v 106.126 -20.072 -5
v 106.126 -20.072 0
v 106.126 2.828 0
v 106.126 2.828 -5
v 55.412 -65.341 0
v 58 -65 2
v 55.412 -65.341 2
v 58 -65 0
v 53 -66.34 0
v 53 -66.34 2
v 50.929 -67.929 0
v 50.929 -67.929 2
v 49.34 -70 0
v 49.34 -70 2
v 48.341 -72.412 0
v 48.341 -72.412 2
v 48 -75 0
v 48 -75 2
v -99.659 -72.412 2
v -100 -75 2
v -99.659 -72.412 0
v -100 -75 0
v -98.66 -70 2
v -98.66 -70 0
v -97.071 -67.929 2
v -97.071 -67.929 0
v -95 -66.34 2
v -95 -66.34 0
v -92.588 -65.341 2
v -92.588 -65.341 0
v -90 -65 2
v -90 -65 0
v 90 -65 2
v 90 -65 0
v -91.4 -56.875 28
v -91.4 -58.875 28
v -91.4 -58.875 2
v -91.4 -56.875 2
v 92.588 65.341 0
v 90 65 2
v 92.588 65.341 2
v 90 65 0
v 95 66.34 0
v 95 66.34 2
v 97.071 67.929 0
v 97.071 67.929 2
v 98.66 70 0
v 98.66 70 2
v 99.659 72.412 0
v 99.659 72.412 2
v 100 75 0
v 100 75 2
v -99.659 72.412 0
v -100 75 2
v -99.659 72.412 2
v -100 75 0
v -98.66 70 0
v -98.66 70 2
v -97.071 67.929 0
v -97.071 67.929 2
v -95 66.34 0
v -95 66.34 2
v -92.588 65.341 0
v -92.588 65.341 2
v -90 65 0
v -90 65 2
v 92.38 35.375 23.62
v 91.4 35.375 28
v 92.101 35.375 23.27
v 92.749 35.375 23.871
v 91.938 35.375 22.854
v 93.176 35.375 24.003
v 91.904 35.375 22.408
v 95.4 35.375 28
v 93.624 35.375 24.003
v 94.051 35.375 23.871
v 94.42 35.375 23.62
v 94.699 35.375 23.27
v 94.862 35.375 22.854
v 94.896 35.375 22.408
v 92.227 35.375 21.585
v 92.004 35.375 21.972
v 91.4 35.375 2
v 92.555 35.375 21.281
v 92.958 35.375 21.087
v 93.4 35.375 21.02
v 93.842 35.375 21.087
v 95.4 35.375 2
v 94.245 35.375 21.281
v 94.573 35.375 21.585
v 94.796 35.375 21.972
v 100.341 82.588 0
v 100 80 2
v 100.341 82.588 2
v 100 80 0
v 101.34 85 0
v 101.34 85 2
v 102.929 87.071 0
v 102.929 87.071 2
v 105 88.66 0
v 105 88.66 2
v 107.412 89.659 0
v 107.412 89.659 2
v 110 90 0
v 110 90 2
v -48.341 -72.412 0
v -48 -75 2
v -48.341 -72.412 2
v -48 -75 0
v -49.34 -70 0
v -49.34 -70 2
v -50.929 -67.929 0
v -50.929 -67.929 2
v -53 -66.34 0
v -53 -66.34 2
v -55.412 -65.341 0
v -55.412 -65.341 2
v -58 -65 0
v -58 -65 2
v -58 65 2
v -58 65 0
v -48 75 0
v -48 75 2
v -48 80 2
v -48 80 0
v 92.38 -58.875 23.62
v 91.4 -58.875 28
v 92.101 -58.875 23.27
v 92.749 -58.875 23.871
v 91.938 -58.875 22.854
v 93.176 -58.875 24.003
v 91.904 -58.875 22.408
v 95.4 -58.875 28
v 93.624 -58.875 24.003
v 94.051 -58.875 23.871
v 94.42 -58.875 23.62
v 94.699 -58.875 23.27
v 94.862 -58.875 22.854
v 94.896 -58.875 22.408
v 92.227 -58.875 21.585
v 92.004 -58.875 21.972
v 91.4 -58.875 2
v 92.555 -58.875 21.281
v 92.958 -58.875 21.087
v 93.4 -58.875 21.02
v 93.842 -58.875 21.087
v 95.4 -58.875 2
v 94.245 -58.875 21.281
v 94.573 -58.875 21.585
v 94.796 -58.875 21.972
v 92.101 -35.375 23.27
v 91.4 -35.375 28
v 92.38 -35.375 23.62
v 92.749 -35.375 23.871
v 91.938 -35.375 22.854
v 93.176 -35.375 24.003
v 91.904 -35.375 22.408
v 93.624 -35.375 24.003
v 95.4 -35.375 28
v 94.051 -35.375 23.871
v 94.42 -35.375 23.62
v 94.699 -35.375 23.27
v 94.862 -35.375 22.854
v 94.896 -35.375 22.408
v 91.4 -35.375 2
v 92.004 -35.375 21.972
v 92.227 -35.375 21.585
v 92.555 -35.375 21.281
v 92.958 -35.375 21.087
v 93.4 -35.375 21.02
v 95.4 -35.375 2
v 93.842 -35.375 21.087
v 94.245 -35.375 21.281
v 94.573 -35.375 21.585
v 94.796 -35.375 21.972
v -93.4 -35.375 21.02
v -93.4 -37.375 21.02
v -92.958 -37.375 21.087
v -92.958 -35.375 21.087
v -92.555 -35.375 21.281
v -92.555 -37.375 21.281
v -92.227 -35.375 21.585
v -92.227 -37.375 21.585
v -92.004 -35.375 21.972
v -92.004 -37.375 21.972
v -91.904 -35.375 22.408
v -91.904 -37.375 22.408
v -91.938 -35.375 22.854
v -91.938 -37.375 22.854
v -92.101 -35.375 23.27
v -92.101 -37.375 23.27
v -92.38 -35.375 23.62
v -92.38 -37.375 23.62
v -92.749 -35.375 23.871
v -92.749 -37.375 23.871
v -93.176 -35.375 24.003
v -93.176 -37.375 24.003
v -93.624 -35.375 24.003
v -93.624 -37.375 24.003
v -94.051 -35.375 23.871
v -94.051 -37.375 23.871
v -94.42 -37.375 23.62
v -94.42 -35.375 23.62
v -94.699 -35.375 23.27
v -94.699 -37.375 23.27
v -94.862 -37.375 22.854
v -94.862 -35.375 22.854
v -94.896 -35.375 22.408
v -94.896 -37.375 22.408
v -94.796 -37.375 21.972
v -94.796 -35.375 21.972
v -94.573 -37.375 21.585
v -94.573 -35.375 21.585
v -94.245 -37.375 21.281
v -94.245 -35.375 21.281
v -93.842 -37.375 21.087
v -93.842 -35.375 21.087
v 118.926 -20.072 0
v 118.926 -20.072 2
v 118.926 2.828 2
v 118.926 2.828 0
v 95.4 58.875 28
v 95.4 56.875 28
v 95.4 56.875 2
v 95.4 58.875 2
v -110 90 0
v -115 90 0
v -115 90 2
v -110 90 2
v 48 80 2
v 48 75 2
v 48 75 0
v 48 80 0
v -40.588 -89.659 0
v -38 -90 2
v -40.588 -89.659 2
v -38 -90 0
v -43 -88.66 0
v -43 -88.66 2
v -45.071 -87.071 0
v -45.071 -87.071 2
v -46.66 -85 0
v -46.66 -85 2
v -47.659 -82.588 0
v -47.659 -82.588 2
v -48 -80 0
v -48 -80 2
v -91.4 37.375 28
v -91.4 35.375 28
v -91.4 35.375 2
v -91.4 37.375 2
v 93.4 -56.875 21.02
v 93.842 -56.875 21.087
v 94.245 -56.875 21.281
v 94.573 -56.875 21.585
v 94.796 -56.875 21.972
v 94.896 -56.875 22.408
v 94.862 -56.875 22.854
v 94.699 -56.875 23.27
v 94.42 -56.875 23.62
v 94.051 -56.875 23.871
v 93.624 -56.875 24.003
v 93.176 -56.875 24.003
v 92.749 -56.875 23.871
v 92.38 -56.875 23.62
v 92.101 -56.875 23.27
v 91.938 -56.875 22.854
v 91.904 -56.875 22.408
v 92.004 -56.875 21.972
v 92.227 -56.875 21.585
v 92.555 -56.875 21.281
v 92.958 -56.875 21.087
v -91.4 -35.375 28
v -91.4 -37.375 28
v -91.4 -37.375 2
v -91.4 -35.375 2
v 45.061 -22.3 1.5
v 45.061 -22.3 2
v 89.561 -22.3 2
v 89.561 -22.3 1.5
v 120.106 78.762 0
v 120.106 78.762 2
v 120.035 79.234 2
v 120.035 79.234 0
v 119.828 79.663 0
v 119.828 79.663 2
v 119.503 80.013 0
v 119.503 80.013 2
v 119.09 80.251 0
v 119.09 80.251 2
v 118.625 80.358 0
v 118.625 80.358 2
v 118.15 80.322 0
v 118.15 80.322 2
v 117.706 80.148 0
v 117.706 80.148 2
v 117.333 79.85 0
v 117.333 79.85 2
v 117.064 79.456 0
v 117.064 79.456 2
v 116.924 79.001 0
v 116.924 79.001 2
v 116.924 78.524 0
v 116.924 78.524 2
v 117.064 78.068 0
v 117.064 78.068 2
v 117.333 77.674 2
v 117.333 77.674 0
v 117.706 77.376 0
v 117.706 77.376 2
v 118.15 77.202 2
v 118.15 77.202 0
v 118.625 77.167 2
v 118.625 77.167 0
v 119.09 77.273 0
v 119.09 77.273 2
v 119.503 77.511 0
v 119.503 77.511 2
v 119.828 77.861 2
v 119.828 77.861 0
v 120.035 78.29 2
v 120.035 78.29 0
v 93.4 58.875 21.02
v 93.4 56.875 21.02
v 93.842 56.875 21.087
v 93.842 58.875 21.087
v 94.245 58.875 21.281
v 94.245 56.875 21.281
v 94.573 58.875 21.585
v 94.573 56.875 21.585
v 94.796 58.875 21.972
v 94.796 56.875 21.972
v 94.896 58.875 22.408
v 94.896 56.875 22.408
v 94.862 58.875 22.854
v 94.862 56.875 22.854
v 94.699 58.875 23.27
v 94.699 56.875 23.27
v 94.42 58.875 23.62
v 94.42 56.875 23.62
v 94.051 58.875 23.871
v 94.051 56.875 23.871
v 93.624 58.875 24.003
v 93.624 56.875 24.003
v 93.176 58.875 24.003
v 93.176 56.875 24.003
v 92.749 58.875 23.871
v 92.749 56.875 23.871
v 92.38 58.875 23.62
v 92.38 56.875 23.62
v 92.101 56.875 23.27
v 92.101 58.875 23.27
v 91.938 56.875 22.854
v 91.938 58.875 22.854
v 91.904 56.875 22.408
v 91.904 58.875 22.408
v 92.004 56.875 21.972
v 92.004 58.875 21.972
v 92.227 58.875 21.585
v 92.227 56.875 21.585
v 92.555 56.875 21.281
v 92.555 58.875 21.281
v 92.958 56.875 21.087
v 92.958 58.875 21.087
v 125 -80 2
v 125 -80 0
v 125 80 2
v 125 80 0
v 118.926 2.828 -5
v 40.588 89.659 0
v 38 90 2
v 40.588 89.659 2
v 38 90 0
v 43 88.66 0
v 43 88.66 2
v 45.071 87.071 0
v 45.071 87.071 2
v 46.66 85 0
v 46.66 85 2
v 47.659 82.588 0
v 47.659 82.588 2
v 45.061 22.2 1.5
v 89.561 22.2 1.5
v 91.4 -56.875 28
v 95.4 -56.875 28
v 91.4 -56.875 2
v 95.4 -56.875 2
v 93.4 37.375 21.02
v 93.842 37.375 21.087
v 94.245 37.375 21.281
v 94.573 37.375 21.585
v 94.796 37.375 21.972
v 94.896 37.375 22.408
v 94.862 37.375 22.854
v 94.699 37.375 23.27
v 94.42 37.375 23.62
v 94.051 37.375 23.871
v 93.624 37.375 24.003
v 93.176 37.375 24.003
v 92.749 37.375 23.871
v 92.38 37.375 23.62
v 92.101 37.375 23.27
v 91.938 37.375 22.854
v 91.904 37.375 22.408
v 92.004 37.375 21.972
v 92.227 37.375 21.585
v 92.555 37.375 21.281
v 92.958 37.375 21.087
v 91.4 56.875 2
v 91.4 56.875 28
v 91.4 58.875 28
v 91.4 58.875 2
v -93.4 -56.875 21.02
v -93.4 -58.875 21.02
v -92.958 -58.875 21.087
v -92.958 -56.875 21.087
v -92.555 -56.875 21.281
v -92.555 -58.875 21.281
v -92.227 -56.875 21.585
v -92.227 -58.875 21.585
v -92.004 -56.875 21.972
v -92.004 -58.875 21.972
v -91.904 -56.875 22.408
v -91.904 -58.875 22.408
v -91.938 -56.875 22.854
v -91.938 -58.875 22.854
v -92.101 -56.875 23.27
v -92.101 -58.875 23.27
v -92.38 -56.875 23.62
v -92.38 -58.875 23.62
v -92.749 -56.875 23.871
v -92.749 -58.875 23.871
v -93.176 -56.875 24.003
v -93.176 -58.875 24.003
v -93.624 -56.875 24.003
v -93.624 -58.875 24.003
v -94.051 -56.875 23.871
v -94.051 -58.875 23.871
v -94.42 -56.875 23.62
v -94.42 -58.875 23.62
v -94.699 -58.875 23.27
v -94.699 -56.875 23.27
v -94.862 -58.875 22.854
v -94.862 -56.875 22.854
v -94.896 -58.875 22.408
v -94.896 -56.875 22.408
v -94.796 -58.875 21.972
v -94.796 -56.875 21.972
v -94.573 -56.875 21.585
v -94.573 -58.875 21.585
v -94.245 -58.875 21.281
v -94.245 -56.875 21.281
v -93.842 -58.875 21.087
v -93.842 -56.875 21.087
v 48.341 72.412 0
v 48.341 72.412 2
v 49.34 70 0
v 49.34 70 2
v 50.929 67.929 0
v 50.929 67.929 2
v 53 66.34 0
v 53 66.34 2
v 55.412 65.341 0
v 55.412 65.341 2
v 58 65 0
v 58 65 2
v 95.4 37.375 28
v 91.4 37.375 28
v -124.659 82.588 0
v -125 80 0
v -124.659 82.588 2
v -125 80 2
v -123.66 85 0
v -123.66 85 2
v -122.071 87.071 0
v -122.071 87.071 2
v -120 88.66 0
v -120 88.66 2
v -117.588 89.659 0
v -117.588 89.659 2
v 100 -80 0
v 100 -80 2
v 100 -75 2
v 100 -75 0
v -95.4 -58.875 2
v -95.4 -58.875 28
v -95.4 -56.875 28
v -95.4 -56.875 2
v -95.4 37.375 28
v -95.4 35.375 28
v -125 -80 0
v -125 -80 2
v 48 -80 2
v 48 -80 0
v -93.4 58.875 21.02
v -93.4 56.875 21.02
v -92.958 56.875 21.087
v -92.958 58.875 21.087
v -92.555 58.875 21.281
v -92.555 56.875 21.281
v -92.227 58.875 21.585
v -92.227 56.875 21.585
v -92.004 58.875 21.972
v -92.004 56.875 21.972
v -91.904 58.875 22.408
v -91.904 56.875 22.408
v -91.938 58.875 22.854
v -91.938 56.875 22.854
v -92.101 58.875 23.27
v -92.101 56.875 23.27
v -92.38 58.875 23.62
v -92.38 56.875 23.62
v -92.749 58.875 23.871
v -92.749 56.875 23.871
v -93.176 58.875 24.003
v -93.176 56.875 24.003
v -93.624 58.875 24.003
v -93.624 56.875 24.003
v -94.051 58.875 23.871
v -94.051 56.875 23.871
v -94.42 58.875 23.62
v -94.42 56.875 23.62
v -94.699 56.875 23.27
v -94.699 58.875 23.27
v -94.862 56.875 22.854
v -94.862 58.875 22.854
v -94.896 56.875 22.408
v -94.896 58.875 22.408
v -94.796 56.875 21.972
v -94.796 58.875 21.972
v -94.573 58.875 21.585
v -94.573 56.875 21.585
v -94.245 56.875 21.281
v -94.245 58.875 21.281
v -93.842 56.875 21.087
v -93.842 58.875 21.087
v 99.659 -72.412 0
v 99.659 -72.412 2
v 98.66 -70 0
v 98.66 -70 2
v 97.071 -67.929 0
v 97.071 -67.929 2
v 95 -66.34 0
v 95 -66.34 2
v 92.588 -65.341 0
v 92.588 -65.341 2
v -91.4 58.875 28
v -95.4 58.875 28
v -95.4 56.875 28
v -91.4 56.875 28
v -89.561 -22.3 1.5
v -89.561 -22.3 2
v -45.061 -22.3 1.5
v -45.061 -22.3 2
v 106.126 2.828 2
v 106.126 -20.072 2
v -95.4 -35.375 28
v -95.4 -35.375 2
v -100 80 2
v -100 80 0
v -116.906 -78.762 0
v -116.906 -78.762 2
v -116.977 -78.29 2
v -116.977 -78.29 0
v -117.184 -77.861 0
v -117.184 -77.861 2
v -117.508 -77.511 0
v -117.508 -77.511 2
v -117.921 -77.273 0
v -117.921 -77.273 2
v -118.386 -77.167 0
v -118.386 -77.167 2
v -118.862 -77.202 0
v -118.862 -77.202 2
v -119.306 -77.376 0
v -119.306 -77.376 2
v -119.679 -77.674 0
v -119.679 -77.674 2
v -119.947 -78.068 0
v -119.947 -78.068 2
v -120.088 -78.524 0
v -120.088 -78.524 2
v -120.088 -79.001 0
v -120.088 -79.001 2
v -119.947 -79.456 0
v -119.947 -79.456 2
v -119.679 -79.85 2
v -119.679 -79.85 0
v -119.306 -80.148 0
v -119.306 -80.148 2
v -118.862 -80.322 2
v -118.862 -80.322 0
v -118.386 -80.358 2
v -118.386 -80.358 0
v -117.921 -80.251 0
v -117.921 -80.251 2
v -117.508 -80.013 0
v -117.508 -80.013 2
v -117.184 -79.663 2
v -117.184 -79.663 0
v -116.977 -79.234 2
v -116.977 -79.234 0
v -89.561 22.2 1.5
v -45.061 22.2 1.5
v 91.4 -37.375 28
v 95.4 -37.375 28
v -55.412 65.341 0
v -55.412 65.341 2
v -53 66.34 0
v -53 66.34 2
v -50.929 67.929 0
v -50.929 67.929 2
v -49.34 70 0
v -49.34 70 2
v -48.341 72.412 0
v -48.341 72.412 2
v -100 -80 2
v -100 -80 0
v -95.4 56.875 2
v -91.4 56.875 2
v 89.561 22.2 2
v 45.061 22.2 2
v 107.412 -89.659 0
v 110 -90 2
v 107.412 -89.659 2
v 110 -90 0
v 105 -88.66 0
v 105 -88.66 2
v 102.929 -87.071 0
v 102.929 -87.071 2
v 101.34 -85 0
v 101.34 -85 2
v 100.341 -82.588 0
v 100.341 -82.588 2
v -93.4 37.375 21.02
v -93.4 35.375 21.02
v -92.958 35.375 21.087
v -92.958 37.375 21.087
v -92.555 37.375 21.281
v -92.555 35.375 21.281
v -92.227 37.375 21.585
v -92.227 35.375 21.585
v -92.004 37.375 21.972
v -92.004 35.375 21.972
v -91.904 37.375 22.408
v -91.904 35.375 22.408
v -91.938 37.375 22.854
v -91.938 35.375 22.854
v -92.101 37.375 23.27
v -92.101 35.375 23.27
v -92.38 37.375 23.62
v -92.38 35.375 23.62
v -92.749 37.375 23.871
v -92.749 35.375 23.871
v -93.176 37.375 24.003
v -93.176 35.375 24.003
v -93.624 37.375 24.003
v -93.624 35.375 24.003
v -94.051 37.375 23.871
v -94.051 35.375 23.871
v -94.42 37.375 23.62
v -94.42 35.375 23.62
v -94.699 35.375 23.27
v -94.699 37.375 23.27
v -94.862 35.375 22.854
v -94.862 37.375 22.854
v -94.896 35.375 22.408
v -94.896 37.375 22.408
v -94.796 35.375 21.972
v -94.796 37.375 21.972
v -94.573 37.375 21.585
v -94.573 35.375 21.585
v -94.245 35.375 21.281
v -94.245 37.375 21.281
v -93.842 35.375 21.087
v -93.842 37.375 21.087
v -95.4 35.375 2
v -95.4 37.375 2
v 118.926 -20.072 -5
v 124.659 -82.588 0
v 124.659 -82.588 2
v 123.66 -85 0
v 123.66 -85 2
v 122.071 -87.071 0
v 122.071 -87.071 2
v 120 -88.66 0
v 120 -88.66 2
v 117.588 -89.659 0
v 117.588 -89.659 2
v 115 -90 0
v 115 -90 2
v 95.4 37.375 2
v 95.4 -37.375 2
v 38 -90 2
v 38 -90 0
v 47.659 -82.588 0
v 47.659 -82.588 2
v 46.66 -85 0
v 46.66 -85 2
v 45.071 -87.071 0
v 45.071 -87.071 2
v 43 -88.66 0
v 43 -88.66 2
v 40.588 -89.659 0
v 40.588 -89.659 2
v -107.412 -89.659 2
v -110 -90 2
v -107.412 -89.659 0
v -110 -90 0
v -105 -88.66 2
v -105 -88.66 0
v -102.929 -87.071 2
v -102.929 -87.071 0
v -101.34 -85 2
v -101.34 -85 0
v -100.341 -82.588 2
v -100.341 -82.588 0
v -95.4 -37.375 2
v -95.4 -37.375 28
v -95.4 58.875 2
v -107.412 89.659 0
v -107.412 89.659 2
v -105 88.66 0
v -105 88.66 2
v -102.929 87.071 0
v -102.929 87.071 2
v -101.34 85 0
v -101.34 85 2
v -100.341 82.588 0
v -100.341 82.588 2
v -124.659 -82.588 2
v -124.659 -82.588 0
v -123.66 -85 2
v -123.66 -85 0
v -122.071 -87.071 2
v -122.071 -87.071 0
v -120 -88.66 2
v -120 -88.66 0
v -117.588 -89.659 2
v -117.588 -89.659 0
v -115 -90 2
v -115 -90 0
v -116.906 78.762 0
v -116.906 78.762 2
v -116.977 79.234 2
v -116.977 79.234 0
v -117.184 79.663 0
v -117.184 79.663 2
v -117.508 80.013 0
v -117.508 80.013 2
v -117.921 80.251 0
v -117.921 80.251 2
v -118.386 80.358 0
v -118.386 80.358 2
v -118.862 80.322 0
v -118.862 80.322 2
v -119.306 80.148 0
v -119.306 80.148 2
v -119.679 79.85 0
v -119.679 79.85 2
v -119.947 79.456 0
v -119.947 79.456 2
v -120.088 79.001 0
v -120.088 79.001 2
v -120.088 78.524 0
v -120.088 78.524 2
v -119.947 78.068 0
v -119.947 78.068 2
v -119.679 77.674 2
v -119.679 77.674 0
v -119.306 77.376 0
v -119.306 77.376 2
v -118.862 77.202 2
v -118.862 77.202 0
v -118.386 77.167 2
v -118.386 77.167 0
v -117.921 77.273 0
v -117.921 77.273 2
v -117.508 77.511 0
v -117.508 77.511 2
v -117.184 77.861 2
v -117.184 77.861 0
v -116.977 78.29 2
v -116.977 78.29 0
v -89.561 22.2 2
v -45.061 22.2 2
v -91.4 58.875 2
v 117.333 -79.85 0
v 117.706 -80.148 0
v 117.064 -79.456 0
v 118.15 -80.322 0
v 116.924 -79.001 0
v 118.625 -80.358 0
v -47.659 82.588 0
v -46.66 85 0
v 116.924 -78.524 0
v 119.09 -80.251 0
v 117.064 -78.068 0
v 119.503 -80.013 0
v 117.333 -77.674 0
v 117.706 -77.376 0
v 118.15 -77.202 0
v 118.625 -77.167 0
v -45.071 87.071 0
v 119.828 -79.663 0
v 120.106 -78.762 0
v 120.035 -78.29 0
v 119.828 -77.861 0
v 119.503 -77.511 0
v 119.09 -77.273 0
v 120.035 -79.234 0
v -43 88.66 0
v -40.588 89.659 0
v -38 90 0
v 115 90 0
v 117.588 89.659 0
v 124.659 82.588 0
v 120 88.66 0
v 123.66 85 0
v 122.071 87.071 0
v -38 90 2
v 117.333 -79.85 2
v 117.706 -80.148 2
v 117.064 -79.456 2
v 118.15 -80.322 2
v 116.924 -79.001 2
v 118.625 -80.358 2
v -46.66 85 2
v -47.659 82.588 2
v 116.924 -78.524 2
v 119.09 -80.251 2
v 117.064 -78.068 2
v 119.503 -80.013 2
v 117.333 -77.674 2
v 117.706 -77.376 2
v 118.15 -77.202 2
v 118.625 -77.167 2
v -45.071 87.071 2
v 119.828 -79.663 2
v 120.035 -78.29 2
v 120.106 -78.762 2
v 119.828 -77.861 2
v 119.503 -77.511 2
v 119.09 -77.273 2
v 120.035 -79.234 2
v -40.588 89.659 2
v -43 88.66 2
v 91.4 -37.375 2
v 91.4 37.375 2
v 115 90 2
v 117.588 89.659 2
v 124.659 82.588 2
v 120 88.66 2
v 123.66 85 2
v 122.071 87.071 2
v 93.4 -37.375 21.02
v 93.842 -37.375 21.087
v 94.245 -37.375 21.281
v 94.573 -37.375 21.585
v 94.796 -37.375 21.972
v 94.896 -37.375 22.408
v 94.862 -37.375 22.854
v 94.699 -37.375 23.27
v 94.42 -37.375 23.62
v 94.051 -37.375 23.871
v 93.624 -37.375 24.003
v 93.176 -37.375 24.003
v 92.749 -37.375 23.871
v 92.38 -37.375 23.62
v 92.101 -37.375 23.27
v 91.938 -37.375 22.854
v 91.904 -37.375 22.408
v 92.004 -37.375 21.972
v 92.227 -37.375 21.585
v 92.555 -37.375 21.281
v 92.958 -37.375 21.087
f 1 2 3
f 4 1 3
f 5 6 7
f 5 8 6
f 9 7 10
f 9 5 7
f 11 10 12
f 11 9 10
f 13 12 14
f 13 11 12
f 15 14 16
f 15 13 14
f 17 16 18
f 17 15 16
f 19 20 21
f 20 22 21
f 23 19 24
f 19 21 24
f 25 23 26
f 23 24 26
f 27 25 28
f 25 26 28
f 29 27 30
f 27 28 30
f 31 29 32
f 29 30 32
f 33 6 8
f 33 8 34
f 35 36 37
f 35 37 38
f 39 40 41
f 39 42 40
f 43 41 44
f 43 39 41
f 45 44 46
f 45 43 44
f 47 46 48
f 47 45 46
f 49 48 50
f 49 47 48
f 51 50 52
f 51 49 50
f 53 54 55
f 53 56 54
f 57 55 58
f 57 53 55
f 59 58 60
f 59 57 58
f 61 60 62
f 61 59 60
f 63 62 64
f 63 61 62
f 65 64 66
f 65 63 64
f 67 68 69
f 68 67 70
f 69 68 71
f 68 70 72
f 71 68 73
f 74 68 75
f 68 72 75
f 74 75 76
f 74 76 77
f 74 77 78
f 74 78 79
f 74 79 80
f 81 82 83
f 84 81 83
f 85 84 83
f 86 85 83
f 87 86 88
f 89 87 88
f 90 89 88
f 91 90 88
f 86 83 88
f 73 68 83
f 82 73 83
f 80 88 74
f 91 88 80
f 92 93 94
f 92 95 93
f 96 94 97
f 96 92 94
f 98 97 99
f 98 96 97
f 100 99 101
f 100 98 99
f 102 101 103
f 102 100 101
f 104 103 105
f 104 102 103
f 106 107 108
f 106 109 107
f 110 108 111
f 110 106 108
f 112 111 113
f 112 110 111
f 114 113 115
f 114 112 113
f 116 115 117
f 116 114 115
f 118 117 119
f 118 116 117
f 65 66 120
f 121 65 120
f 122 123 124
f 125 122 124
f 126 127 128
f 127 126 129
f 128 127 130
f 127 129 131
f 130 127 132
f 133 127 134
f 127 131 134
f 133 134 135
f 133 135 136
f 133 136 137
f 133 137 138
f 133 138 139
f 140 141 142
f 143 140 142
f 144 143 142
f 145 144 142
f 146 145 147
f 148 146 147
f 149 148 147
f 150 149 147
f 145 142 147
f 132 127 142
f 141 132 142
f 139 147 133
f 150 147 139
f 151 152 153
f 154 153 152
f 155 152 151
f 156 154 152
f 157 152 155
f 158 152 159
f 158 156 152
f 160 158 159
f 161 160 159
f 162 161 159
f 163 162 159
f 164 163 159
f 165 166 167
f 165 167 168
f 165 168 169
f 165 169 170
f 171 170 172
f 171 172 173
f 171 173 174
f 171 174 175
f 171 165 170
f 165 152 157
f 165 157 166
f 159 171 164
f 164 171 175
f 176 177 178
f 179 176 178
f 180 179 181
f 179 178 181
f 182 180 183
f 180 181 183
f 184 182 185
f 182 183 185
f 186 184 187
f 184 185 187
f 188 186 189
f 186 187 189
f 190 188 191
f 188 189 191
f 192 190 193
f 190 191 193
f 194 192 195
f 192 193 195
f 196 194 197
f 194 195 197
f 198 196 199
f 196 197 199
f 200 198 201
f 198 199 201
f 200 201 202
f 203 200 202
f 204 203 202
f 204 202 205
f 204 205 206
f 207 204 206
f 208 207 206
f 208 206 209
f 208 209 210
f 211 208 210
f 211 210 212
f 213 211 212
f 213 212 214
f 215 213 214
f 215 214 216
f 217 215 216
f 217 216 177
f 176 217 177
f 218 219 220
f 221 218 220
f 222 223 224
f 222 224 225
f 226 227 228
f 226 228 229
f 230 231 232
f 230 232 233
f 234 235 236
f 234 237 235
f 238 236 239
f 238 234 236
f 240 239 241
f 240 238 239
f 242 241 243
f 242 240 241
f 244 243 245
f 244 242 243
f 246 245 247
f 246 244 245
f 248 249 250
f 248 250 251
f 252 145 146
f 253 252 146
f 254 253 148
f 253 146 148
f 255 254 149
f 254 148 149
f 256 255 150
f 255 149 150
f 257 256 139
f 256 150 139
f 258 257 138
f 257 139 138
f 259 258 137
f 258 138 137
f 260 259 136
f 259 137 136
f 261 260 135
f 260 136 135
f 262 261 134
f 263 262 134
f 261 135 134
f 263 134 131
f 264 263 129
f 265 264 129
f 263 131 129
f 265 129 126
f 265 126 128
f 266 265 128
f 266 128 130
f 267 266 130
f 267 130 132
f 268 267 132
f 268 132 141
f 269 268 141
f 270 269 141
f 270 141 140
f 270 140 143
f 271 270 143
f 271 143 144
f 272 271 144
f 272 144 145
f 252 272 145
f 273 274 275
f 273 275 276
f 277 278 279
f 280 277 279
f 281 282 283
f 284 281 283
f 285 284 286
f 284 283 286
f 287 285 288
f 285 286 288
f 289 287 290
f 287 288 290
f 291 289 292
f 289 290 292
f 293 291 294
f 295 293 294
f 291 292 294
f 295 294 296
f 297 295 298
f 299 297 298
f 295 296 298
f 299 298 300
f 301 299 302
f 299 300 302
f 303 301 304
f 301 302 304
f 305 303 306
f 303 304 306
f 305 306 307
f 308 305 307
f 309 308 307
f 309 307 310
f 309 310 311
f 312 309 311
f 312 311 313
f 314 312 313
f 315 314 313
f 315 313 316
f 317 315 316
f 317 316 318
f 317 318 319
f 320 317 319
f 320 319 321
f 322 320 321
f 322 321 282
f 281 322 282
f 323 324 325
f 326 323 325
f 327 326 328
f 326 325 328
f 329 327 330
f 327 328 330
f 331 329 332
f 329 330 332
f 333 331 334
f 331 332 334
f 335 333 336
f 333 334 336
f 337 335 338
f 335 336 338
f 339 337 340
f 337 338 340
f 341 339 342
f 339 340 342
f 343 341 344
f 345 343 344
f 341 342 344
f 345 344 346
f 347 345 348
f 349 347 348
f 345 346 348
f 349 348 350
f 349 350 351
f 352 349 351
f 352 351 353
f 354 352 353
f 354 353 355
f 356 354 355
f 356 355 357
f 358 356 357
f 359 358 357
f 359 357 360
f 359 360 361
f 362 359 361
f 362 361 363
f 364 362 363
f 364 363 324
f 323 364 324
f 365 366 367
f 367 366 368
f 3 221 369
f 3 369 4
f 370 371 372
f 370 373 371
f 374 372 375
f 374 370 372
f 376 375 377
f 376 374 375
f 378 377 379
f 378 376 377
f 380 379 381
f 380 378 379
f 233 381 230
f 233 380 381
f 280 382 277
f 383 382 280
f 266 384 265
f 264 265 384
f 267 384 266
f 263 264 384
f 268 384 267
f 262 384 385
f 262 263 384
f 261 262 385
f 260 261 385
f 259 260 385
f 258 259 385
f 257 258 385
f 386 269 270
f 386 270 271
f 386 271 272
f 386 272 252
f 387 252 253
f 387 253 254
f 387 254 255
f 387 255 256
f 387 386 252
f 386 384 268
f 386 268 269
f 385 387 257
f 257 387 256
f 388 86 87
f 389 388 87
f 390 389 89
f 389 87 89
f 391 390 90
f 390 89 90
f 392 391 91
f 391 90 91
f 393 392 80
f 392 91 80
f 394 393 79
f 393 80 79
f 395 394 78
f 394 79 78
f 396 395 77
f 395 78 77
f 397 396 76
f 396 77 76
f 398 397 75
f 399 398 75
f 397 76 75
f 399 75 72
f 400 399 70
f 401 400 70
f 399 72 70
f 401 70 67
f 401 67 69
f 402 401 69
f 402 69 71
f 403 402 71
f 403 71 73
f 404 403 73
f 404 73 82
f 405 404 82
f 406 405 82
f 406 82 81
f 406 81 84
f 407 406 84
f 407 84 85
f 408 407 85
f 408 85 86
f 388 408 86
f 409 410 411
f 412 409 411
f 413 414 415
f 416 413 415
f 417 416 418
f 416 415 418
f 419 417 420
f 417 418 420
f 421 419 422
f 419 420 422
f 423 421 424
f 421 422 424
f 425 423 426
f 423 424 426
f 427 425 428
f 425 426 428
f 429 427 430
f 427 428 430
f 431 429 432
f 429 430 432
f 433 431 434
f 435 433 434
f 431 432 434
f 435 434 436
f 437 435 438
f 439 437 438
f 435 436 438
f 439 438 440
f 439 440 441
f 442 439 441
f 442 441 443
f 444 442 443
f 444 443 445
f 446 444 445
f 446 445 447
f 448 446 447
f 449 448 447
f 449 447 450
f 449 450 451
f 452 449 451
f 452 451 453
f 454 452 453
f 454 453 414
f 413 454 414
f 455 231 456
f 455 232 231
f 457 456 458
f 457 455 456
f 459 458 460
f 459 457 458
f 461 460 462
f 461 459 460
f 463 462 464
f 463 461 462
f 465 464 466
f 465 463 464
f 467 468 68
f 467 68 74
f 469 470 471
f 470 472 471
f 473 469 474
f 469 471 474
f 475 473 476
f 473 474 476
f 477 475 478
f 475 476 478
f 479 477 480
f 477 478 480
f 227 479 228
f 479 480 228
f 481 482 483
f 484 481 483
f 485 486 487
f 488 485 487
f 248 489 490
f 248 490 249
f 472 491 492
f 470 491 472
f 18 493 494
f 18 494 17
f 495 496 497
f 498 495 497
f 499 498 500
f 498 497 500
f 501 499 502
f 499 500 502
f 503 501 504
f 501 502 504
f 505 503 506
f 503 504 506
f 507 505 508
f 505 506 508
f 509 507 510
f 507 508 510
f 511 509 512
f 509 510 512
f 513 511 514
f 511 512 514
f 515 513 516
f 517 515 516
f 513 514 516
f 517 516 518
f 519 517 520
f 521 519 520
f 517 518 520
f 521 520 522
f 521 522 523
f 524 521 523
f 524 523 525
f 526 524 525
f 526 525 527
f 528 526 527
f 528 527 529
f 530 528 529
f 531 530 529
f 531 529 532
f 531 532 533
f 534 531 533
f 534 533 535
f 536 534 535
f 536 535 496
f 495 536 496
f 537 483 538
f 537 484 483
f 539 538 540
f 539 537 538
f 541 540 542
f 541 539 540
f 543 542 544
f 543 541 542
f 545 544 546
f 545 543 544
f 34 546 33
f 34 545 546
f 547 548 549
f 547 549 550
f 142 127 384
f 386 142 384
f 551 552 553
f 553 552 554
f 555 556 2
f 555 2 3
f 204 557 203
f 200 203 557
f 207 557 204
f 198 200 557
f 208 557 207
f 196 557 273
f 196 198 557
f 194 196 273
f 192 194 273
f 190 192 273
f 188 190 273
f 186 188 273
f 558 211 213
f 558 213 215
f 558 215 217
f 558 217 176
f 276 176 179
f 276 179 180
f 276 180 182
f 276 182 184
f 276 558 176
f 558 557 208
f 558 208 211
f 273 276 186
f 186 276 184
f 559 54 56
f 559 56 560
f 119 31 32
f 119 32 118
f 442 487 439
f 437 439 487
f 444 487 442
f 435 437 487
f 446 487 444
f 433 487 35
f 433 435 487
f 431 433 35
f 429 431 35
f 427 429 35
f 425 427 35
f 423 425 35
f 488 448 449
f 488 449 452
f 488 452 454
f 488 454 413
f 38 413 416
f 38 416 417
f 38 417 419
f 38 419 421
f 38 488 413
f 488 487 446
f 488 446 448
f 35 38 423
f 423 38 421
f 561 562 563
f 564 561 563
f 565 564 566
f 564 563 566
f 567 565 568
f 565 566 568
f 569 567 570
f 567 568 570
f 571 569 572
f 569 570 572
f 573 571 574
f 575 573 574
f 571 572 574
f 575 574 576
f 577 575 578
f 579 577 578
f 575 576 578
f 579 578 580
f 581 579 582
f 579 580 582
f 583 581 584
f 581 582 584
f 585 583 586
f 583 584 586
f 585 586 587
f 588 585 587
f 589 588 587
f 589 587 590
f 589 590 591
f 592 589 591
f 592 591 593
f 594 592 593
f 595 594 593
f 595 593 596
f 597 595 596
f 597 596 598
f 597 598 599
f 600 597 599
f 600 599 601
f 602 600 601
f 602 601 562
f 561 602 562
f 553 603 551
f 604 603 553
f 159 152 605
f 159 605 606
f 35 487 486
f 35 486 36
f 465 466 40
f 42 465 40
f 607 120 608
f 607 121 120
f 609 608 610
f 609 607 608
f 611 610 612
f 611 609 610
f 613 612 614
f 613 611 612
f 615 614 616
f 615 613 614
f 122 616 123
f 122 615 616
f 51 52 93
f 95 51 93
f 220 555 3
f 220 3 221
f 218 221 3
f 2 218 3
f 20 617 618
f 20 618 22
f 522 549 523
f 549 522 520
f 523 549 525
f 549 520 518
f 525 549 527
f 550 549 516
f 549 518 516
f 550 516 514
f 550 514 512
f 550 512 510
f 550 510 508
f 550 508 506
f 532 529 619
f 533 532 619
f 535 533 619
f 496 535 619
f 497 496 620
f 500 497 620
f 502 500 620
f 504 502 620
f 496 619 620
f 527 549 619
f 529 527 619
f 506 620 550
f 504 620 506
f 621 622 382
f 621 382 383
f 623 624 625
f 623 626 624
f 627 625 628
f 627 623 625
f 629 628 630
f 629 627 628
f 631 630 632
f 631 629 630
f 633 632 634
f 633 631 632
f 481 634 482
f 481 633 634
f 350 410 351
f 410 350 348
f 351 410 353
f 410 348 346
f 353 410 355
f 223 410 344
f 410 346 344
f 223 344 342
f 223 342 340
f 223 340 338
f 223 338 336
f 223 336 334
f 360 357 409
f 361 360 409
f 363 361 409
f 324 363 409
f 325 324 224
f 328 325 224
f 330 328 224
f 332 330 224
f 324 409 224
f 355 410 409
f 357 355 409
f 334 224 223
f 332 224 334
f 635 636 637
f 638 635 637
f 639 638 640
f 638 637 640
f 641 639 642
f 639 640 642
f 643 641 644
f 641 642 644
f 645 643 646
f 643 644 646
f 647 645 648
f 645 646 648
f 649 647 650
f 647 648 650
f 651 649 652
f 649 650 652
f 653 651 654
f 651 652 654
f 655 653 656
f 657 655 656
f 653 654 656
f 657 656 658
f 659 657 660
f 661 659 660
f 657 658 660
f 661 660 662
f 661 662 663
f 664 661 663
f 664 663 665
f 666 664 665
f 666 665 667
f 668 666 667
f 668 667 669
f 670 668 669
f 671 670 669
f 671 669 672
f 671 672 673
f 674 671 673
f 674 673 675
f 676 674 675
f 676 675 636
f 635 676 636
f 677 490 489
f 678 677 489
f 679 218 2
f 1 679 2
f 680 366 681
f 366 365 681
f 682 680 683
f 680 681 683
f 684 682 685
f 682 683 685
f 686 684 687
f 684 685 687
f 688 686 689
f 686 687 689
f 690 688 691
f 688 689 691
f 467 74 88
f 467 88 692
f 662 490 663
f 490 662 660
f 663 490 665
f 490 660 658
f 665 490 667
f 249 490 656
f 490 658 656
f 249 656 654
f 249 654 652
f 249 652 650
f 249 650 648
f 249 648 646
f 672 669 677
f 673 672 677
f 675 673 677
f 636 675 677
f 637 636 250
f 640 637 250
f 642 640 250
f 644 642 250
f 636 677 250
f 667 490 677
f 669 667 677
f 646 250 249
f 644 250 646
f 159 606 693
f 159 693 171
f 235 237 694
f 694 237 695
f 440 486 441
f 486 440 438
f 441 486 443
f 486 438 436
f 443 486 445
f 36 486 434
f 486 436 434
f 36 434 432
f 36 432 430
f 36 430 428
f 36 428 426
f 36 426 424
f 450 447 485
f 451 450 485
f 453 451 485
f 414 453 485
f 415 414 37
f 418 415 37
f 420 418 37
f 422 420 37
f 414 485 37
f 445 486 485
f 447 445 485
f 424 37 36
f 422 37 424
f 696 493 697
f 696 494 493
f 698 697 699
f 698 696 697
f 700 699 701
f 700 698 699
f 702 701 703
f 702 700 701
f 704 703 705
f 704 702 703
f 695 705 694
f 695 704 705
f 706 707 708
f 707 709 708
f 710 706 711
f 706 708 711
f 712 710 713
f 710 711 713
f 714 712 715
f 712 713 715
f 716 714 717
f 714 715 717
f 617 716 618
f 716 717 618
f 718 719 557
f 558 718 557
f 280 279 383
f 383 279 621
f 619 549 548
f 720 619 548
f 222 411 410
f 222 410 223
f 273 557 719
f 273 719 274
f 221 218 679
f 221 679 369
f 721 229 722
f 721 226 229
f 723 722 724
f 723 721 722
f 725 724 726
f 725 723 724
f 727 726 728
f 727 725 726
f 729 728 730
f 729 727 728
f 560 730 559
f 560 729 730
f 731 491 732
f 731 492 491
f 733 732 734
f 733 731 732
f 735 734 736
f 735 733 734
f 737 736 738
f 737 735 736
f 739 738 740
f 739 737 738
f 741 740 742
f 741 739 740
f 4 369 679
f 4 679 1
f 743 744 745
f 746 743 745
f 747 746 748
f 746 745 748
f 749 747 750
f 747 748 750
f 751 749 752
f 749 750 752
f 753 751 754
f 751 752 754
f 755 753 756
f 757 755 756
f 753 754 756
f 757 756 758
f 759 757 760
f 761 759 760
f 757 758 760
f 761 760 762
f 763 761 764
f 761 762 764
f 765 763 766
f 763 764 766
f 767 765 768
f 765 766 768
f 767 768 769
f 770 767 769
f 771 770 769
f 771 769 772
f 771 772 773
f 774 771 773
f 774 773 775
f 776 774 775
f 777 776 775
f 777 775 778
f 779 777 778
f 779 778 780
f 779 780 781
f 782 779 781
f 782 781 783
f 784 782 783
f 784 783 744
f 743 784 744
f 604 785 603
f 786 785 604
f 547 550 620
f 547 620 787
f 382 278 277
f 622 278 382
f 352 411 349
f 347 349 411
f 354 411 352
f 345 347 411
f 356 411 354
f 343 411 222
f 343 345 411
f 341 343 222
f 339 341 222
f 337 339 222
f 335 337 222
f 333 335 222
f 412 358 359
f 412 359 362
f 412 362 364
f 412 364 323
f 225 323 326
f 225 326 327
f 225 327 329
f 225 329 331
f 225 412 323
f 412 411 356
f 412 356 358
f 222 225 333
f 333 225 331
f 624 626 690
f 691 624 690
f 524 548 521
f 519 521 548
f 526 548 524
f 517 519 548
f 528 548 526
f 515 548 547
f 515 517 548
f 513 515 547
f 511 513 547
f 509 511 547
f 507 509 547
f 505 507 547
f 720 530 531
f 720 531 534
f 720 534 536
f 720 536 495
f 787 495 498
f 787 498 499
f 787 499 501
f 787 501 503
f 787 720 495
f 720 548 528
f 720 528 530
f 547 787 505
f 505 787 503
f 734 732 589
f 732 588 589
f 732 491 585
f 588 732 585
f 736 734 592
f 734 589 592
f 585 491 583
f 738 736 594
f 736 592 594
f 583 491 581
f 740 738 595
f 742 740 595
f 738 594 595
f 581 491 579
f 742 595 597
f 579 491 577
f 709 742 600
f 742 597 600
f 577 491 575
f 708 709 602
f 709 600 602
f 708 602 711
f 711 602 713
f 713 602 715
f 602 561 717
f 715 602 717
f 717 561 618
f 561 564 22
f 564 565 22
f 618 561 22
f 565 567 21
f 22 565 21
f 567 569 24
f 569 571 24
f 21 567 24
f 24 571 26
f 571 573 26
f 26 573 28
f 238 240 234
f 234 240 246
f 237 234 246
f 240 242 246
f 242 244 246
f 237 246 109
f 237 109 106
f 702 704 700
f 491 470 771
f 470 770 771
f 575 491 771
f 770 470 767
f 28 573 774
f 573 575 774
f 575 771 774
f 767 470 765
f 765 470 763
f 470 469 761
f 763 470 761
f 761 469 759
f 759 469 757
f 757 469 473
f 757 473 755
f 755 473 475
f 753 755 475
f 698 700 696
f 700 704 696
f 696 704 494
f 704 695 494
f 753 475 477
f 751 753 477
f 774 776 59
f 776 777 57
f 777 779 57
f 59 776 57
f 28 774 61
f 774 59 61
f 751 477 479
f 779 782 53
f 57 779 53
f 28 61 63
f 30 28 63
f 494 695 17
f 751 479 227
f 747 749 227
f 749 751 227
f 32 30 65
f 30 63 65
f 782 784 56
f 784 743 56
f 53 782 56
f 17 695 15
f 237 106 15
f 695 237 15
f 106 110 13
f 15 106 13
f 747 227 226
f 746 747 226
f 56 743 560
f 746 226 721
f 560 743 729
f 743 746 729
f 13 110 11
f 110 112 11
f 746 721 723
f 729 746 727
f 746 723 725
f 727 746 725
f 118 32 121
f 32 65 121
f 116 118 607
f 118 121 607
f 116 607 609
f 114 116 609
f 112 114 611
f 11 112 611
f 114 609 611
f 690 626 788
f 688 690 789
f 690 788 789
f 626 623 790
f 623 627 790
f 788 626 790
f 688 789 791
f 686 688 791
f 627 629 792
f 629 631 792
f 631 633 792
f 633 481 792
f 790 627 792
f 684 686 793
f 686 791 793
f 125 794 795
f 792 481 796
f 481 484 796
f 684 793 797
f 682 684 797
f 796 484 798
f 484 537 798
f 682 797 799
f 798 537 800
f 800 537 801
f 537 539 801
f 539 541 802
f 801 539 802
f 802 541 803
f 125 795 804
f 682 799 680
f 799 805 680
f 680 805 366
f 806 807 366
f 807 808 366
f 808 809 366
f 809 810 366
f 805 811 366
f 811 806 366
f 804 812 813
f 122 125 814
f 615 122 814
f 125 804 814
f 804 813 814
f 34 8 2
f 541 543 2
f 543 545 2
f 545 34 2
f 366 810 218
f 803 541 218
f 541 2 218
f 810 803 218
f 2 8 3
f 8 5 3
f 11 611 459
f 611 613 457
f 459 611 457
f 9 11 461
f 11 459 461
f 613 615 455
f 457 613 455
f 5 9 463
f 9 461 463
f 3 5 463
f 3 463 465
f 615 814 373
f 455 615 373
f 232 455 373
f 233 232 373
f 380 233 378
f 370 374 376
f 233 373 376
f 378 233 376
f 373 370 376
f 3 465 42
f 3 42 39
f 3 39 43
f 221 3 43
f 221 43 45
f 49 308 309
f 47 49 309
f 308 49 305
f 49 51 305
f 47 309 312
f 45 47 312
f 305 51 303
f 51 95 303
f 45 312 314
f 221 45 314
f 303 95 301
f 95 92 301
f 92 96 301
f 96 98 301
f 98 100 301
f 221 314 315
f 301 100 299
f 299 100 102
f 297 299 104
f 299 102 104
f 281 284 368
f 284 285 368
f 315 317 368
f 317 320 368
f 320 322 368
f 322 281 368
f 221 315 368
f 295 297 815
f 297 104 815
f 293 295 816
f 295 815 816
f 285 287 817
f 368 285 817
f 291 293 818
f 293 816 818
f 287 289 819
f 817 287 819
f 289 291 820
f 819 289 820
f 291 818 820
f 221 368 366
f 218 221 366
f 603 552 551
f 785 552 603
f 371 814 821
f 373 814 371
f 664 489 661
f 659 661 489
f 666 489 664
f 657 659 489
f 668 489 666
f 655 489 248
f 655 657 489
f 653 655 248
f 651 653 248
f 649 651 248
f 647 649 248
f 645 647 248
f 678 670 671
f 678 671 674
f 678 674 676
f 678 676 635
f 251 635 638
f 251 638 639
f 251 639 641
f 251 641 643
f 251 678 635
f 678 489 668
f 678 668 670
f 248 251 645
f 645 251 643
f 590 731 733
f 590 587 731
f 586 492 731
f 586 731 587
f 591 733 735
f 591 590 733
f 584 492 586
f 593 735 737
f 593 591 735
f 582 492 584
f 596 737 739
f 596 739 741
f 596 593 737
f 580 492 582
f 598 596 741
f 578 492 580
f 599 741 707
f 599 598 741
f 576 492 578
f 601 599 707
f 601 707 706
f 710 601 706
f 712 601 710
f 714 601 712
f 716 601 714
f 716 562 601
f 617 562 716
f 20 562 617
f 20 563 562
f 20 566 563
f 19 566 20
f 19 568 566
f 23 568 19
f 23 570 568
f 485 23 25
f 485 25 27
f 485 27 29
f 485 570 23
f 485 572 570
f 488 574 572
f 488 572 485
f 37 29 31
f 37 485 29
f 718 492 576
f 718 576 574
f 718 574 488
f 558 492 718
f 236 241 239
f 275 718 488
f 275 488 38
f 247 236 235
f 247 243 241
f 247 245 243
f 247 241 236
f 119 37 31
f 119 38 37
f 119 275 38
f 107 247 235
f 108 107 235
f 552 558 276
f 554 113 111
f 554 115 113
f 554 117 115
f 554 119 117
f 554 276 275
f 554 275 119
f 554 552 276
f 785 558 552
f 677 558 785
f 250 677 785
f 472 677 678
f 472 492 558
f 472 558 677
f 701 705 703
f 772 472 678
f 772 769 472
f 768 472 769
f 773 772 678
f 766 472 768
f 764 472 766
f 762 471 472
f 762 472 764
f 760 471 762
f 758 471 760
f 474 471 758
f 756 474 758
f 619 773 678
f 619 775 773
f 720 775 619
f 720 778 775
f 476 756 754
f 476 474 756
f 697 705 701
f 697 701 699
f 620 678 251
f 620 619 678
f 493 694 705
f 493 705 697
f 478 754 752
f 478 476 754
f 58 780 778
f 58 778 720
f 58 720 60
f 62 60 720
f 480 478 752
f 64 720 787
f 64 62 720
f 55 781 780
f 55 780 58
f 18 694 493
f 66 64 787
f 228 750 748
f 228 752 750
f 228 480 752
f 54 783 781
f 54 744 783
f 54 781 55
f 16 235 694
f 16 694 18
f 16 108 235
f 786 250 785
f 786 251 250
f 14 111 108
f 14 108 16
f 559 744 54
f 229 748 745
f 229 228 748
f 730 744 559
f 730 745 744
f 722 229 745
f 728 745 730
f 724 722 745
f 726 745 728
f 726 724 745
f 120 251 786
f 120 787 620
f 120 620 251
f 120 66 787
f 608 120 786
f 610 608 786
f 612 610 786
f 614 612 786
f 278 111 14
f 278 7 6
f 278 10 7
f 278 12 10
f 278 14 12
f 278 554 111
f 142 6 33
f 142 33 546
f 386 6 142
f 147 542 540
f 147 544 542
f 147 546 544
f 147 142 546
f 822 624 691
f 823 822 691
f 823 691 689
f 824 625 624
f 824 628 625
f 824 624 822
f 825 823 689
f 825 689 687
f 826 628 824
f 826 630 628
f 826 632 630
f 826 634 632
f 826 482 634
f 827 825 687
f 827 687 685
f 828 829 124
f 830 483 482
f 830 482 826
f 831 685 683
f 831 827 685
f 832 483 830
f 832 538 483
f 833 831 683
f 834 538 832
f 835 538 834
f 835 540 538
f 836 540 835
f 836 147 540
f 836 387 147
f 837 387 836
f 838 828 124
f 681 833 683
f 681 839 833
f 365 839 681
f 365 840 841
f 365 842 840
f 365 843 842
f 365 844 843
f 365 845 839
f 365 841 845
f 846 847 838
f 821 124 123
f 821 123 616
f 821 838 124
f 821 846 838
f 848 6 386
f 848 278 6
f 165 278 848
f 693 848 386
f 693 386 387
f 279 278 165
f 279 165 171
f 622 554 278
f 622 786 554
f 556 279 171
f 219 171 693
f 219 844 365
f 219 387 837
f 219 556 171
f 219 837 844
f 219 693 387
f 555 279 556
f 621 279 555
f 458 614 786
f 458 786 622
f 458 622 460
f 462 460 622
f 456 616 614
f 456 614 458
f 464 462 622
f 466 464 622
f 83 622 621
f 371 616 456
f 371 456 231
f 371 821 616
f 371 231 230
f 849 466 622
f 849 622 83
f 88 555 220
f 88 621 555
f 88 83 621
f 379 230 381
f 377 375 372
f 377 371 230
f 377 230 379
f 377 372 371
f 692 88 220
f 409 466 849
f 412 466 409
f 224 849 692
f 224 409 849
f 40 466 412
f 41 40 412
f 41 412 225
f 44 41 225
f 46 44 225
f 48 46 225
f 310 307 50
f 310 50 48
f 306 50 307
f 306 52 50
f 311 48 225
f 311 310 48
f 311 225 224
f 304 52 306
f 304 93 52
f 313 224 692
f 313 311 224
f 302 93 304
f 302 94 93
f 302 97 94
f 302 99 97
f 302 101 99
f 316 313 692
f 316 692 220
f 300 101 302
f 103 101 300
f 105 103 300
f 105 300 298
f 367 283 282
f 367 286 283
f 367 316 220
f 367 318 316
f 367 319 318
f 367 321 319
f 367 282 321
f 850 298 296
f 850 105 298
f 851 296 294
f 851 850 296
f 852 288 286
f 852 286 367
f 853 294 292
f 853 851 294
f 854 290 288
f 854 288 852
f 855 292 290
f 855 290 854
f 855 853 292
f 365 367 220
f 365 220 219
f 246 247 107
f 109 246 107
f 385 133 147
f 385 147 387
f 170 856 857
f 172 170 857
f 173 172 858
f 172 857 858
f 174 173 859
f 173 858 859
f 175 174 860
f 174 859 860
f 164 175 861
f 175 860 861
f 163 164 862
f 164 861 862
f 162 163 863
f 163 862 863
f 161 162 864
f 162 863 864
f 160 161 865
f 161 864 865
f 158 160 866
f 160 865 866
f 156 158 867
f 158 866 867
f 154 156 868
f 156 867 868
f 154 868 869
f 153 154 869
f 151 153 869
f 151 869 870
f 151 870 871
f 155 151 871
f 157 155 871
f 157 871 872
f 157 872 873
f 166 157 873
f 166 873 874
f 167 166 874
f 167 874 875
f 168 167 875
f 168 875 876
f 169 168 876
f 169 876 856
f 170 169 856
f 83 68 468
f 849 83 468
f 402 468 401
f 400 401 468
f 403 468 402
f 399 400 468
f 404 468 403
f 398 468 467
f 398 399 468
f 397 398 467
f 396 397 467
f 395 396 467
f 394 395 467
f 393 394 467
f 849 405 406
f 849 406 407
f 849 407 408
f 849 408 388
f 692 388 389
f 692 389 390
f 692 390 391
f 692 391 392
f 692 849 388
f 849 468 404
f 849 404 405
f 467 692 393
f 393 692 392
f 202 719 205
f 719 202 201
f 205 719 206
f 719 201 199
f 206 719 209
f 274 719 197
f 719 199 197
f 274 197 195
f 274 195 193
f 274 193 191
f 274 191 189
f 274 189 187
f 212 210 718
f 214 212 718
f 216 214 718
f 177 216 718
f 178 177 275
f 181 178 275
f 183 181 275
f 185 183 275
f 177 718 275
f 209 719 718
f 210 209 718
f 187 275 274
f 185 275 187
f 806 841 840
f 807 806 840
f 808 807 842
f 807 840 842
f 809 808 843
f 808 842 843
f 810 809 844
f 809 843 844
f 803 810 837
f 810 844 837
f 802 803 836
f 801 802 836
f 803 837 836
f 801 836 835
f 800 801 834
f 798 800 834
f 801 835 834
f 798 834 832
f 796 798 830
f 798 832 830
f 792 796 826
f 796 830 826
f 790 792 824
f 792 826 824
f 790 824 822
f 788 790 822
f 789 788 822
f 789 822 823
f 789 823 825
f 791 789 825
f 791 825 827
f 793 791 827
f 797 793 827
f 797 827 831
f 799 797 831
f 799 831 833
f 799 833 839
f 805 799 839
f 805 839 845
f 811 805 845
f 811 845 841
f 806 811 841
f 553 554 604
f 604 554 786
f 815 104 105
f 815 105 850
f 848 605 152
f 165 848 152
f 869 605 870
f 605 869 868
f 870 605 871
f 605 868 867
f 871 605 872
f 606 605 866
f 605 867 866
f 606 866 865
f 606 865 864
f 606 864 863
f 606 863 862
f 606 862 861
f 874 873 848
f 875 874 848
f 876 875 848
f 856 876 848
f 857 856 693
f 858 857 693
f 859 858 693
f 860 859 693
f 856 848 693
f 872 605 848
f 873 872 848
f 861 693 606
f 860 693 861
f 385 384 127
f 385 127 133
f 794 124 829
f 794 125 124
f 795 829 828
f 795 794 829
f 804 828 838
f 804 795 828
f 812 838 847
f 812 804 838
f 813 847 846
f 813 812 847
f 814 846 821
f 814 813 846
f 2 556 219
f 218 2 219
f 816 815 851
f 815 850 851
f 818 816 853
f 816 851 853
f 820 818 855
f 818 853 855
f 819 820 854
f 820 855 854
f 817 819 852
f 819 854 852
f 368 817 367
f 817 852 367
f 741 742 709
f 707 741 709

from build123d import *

# Parameters (mm, degrees)
ESQUISSE1_W              = 250
ESQUISSE1_H              = 180
BOSS_EXTRU_1_DEPTH       = 2
ESQUISSE2_W              = 52
ESQUISSE2_H              = 25
ENL_V_MAT_EXTRU_1_DEPTH  = 155.04220201
CONG_4_R                 = 10
ESQUISSE23_W             = 12.8
ESQUISSE23_H             = 22.9
ENL_V_MAT_EXTRU_13_DEPTH = 2
ESQUISSE24_W             = 44.5
ESQUISSE24_H             = 44.5
ENL_V_MAT_EXTRU_14_DEPTH = 0.5
ESQUISSE33_R             = 1.6
ENL_V_MAT_EXTRU_24_DEPTH = 155.04220201
ESQUISSE40_W             = 4
ESQUISSE40_H             = 2
BOSS_EXTRU_12_DEPTH      = 26
ESQUISSE41_R             = 1.5
ENL_V_MAT_EXTRU_25_DEPTH = 197.399427932
ESQUISSE42_W             = 12.8
ESQUISSE42_H             = 22.9
BOSS_EXTRU_13_DEPTH      = 5


with BuildPart() as part:
    # Esquisse1 → Boss.-Extru.1 (new body)
    with BuildSketch(Plane.XY):
        Rectangle(ESQUISSE1_W, ESQUISSE1_H)
    extrude(amount=BOSS_EXTRU_1_DEPTH)

    # Esquisse2 → Enlèv. mat.-Extru.1 (cut, through all)
    with BuildSketch(Plane.XY.offset(2)):
        with Locations((-74, 77.5)):
            Rectangle(ESQUISSE2_W, ESQUISSE2_H)
        with Locations((-74, -77.5)):
            Rectangle(ESQUISSE2_W, ESQUISSE2_H)
        with Locations((74, -77.5)):
            Rectangle(ESQUISSE2_W, ESQUISSE2_H)
        with Locations((74, 77.5)):
            Rectangle(ESQUISSE2_W, ESQUISSE2_H)
    extrude(amount=-ENL_V_MAT_EXTRU_1_DEPTH, mode=Mode.SUBTRACT)

    # Congé4
    cong_4_edges = [part.edges().sort_by_distance(p)[0] for p in [
        (-100, 90, 1),
        (-48, 90, 1),
        (-48, 65, 1),
        (-100, 65, 1),
        (100, 90, 1),
        (100, 65, 1),
        (48, 65, 1),
        (48, 90, 1),
        (48, -90, 1),
        (48, -65, 1),
        (100, -65, 1),
        (100, -90, 1),
        (-100, -90, 1),
        (-100, -65, 1),
        (-48, -65, 1),
        (-48, -90, 1),
        (-125, 90, 1),
        (125, 90, 1),
        (125, -90, 1),
        (-125, -90, 1),
    ]]
    fillet(cong_4_edges, radius=CONG_4_R)

    # Esquisse23 → Enlèv. mat.-Extru.13 (cut)
    with BuildSketch(Plane.XY.offset(2)):
        with Locations((112.526313531, -8.621941671)):
            Rectangle(ESQUISSE23_W, ESQUISSE23_H)
    extrude(amount=-ENL_V_MAT_EXTRU_13_DEPTH, mode=Mode.SUBTRACT)

    # Esquisse24 → Enlèv. mat.-Extru.14 (cut)
    with BuildSketch(Plane.XY.offset(2)):
        with Locations((-67.310804376, -0.05)):
            Rectangle(ESQUISSE24_W, ESQUISSE24_H)
        with Locations((67.310804376, -0.05)):
            Rectangle(ESQUISSE24_W, ESQUISSE24_H)
    extrude(amount=-ENL_V_MAT_EXTRU_14_DEPTH, mode=Mode.SUBTRACT)

    # Esquisse33 → Enlèv. mat.-Extru.24 (cut, through all)
    with BuildSketch(Plane.XY.offset(2)):
        with Locations((-118.505743781, 78.762079404)):
            Circle(ESQUISSE33_R)
        with Locations((118.505743781, 78.762079404)):
            Circle(ESQUISSE33_R)
        with Locations((118.505743781, -78.762079404)):
            Circle(ESQUISSE33_R)
        with Locations((-118.505743781, -78.762079404)):
            Circle(ESQUISSE33_R)
    extrude(amount=-ENL_V_MAT_EXTRU_24_DEPTH, mode=Mode.SUBTRACT)

    # Esquisse40 → Boss.-Extru.12 (add)
    with BuildSketch(Plane.XY.offset(2)):
        with Locations((-93.4, -57.874898126)):
            Rectangle(ESQUISSE40_W, ESQUISSE40_H)
        with Locations((-93.4, -36.374898126)):
            Rectangle(ESQUISSE40_W, ESQUISSE40_H)
        with Locations((-93.4, 36.374898126)):
            Rectangle(ESQUISSE40_W, ESQUISSE40_H)
        with Locations((-93.4, 57.874898126)):
            Rectangle(ESQUISSE40_W, ESQUISSE40_H)
        with Locations((93.4, 57.874898126)):
            Rectangle(ESQUISSE40_W, ESQUISSE40_H)
        with Locations((93.4, 36.374898126)):
            Rectangle(ESQUISSE40_W, ESQUISSE40_H)
        with Locations((93.4, -36.374898126)):
            Rectangle(ESQUISSE40_W, ESQUISSE40_H)
        with Locations((93.4, -57.874898126)):
            Rectangle(ESQUISSE40_W, ESQUISSE40_H)
    extrude(amount=BOSS_EXTRU_12_DEPTH)

    # Esquisse41 → Enlèv. mat.-Extru.25 (cut, through all)
    with BuildSketch(Plane.XZ.offset(58.874898126)):
        with Locations(Location((-93.4, 22.52, 0), (0, 0, 270))):
            Circle(ESQUISSE41_R)
        with Locations(Location((93.4, 22.52, 0), (0, 0, 270))):
            Circle(ESQUISSE41_R)
    extrude(amount=-ENL_V_MAT_EXTRU_25_DEPTH, mode=Mode.SUBTRACT)


with BuildPart() as body_2:
    # Esquisse42 → Boss.-Extru.13 (new body)
    with BuildSketch(Plane(origin=(0, 0, 0), x_dir=(-1, 0, 0), z_dir=(0, 0, -1))):
        with Locations((-112.526313531, -8.621941671)):
            Rectangle(ESQUISSE42_W, ESQUISSE42_H)
    extrude(amount=BOSS_EXTRU_13_DEPTH)


solid = Compound([part.part, body_2.part])
